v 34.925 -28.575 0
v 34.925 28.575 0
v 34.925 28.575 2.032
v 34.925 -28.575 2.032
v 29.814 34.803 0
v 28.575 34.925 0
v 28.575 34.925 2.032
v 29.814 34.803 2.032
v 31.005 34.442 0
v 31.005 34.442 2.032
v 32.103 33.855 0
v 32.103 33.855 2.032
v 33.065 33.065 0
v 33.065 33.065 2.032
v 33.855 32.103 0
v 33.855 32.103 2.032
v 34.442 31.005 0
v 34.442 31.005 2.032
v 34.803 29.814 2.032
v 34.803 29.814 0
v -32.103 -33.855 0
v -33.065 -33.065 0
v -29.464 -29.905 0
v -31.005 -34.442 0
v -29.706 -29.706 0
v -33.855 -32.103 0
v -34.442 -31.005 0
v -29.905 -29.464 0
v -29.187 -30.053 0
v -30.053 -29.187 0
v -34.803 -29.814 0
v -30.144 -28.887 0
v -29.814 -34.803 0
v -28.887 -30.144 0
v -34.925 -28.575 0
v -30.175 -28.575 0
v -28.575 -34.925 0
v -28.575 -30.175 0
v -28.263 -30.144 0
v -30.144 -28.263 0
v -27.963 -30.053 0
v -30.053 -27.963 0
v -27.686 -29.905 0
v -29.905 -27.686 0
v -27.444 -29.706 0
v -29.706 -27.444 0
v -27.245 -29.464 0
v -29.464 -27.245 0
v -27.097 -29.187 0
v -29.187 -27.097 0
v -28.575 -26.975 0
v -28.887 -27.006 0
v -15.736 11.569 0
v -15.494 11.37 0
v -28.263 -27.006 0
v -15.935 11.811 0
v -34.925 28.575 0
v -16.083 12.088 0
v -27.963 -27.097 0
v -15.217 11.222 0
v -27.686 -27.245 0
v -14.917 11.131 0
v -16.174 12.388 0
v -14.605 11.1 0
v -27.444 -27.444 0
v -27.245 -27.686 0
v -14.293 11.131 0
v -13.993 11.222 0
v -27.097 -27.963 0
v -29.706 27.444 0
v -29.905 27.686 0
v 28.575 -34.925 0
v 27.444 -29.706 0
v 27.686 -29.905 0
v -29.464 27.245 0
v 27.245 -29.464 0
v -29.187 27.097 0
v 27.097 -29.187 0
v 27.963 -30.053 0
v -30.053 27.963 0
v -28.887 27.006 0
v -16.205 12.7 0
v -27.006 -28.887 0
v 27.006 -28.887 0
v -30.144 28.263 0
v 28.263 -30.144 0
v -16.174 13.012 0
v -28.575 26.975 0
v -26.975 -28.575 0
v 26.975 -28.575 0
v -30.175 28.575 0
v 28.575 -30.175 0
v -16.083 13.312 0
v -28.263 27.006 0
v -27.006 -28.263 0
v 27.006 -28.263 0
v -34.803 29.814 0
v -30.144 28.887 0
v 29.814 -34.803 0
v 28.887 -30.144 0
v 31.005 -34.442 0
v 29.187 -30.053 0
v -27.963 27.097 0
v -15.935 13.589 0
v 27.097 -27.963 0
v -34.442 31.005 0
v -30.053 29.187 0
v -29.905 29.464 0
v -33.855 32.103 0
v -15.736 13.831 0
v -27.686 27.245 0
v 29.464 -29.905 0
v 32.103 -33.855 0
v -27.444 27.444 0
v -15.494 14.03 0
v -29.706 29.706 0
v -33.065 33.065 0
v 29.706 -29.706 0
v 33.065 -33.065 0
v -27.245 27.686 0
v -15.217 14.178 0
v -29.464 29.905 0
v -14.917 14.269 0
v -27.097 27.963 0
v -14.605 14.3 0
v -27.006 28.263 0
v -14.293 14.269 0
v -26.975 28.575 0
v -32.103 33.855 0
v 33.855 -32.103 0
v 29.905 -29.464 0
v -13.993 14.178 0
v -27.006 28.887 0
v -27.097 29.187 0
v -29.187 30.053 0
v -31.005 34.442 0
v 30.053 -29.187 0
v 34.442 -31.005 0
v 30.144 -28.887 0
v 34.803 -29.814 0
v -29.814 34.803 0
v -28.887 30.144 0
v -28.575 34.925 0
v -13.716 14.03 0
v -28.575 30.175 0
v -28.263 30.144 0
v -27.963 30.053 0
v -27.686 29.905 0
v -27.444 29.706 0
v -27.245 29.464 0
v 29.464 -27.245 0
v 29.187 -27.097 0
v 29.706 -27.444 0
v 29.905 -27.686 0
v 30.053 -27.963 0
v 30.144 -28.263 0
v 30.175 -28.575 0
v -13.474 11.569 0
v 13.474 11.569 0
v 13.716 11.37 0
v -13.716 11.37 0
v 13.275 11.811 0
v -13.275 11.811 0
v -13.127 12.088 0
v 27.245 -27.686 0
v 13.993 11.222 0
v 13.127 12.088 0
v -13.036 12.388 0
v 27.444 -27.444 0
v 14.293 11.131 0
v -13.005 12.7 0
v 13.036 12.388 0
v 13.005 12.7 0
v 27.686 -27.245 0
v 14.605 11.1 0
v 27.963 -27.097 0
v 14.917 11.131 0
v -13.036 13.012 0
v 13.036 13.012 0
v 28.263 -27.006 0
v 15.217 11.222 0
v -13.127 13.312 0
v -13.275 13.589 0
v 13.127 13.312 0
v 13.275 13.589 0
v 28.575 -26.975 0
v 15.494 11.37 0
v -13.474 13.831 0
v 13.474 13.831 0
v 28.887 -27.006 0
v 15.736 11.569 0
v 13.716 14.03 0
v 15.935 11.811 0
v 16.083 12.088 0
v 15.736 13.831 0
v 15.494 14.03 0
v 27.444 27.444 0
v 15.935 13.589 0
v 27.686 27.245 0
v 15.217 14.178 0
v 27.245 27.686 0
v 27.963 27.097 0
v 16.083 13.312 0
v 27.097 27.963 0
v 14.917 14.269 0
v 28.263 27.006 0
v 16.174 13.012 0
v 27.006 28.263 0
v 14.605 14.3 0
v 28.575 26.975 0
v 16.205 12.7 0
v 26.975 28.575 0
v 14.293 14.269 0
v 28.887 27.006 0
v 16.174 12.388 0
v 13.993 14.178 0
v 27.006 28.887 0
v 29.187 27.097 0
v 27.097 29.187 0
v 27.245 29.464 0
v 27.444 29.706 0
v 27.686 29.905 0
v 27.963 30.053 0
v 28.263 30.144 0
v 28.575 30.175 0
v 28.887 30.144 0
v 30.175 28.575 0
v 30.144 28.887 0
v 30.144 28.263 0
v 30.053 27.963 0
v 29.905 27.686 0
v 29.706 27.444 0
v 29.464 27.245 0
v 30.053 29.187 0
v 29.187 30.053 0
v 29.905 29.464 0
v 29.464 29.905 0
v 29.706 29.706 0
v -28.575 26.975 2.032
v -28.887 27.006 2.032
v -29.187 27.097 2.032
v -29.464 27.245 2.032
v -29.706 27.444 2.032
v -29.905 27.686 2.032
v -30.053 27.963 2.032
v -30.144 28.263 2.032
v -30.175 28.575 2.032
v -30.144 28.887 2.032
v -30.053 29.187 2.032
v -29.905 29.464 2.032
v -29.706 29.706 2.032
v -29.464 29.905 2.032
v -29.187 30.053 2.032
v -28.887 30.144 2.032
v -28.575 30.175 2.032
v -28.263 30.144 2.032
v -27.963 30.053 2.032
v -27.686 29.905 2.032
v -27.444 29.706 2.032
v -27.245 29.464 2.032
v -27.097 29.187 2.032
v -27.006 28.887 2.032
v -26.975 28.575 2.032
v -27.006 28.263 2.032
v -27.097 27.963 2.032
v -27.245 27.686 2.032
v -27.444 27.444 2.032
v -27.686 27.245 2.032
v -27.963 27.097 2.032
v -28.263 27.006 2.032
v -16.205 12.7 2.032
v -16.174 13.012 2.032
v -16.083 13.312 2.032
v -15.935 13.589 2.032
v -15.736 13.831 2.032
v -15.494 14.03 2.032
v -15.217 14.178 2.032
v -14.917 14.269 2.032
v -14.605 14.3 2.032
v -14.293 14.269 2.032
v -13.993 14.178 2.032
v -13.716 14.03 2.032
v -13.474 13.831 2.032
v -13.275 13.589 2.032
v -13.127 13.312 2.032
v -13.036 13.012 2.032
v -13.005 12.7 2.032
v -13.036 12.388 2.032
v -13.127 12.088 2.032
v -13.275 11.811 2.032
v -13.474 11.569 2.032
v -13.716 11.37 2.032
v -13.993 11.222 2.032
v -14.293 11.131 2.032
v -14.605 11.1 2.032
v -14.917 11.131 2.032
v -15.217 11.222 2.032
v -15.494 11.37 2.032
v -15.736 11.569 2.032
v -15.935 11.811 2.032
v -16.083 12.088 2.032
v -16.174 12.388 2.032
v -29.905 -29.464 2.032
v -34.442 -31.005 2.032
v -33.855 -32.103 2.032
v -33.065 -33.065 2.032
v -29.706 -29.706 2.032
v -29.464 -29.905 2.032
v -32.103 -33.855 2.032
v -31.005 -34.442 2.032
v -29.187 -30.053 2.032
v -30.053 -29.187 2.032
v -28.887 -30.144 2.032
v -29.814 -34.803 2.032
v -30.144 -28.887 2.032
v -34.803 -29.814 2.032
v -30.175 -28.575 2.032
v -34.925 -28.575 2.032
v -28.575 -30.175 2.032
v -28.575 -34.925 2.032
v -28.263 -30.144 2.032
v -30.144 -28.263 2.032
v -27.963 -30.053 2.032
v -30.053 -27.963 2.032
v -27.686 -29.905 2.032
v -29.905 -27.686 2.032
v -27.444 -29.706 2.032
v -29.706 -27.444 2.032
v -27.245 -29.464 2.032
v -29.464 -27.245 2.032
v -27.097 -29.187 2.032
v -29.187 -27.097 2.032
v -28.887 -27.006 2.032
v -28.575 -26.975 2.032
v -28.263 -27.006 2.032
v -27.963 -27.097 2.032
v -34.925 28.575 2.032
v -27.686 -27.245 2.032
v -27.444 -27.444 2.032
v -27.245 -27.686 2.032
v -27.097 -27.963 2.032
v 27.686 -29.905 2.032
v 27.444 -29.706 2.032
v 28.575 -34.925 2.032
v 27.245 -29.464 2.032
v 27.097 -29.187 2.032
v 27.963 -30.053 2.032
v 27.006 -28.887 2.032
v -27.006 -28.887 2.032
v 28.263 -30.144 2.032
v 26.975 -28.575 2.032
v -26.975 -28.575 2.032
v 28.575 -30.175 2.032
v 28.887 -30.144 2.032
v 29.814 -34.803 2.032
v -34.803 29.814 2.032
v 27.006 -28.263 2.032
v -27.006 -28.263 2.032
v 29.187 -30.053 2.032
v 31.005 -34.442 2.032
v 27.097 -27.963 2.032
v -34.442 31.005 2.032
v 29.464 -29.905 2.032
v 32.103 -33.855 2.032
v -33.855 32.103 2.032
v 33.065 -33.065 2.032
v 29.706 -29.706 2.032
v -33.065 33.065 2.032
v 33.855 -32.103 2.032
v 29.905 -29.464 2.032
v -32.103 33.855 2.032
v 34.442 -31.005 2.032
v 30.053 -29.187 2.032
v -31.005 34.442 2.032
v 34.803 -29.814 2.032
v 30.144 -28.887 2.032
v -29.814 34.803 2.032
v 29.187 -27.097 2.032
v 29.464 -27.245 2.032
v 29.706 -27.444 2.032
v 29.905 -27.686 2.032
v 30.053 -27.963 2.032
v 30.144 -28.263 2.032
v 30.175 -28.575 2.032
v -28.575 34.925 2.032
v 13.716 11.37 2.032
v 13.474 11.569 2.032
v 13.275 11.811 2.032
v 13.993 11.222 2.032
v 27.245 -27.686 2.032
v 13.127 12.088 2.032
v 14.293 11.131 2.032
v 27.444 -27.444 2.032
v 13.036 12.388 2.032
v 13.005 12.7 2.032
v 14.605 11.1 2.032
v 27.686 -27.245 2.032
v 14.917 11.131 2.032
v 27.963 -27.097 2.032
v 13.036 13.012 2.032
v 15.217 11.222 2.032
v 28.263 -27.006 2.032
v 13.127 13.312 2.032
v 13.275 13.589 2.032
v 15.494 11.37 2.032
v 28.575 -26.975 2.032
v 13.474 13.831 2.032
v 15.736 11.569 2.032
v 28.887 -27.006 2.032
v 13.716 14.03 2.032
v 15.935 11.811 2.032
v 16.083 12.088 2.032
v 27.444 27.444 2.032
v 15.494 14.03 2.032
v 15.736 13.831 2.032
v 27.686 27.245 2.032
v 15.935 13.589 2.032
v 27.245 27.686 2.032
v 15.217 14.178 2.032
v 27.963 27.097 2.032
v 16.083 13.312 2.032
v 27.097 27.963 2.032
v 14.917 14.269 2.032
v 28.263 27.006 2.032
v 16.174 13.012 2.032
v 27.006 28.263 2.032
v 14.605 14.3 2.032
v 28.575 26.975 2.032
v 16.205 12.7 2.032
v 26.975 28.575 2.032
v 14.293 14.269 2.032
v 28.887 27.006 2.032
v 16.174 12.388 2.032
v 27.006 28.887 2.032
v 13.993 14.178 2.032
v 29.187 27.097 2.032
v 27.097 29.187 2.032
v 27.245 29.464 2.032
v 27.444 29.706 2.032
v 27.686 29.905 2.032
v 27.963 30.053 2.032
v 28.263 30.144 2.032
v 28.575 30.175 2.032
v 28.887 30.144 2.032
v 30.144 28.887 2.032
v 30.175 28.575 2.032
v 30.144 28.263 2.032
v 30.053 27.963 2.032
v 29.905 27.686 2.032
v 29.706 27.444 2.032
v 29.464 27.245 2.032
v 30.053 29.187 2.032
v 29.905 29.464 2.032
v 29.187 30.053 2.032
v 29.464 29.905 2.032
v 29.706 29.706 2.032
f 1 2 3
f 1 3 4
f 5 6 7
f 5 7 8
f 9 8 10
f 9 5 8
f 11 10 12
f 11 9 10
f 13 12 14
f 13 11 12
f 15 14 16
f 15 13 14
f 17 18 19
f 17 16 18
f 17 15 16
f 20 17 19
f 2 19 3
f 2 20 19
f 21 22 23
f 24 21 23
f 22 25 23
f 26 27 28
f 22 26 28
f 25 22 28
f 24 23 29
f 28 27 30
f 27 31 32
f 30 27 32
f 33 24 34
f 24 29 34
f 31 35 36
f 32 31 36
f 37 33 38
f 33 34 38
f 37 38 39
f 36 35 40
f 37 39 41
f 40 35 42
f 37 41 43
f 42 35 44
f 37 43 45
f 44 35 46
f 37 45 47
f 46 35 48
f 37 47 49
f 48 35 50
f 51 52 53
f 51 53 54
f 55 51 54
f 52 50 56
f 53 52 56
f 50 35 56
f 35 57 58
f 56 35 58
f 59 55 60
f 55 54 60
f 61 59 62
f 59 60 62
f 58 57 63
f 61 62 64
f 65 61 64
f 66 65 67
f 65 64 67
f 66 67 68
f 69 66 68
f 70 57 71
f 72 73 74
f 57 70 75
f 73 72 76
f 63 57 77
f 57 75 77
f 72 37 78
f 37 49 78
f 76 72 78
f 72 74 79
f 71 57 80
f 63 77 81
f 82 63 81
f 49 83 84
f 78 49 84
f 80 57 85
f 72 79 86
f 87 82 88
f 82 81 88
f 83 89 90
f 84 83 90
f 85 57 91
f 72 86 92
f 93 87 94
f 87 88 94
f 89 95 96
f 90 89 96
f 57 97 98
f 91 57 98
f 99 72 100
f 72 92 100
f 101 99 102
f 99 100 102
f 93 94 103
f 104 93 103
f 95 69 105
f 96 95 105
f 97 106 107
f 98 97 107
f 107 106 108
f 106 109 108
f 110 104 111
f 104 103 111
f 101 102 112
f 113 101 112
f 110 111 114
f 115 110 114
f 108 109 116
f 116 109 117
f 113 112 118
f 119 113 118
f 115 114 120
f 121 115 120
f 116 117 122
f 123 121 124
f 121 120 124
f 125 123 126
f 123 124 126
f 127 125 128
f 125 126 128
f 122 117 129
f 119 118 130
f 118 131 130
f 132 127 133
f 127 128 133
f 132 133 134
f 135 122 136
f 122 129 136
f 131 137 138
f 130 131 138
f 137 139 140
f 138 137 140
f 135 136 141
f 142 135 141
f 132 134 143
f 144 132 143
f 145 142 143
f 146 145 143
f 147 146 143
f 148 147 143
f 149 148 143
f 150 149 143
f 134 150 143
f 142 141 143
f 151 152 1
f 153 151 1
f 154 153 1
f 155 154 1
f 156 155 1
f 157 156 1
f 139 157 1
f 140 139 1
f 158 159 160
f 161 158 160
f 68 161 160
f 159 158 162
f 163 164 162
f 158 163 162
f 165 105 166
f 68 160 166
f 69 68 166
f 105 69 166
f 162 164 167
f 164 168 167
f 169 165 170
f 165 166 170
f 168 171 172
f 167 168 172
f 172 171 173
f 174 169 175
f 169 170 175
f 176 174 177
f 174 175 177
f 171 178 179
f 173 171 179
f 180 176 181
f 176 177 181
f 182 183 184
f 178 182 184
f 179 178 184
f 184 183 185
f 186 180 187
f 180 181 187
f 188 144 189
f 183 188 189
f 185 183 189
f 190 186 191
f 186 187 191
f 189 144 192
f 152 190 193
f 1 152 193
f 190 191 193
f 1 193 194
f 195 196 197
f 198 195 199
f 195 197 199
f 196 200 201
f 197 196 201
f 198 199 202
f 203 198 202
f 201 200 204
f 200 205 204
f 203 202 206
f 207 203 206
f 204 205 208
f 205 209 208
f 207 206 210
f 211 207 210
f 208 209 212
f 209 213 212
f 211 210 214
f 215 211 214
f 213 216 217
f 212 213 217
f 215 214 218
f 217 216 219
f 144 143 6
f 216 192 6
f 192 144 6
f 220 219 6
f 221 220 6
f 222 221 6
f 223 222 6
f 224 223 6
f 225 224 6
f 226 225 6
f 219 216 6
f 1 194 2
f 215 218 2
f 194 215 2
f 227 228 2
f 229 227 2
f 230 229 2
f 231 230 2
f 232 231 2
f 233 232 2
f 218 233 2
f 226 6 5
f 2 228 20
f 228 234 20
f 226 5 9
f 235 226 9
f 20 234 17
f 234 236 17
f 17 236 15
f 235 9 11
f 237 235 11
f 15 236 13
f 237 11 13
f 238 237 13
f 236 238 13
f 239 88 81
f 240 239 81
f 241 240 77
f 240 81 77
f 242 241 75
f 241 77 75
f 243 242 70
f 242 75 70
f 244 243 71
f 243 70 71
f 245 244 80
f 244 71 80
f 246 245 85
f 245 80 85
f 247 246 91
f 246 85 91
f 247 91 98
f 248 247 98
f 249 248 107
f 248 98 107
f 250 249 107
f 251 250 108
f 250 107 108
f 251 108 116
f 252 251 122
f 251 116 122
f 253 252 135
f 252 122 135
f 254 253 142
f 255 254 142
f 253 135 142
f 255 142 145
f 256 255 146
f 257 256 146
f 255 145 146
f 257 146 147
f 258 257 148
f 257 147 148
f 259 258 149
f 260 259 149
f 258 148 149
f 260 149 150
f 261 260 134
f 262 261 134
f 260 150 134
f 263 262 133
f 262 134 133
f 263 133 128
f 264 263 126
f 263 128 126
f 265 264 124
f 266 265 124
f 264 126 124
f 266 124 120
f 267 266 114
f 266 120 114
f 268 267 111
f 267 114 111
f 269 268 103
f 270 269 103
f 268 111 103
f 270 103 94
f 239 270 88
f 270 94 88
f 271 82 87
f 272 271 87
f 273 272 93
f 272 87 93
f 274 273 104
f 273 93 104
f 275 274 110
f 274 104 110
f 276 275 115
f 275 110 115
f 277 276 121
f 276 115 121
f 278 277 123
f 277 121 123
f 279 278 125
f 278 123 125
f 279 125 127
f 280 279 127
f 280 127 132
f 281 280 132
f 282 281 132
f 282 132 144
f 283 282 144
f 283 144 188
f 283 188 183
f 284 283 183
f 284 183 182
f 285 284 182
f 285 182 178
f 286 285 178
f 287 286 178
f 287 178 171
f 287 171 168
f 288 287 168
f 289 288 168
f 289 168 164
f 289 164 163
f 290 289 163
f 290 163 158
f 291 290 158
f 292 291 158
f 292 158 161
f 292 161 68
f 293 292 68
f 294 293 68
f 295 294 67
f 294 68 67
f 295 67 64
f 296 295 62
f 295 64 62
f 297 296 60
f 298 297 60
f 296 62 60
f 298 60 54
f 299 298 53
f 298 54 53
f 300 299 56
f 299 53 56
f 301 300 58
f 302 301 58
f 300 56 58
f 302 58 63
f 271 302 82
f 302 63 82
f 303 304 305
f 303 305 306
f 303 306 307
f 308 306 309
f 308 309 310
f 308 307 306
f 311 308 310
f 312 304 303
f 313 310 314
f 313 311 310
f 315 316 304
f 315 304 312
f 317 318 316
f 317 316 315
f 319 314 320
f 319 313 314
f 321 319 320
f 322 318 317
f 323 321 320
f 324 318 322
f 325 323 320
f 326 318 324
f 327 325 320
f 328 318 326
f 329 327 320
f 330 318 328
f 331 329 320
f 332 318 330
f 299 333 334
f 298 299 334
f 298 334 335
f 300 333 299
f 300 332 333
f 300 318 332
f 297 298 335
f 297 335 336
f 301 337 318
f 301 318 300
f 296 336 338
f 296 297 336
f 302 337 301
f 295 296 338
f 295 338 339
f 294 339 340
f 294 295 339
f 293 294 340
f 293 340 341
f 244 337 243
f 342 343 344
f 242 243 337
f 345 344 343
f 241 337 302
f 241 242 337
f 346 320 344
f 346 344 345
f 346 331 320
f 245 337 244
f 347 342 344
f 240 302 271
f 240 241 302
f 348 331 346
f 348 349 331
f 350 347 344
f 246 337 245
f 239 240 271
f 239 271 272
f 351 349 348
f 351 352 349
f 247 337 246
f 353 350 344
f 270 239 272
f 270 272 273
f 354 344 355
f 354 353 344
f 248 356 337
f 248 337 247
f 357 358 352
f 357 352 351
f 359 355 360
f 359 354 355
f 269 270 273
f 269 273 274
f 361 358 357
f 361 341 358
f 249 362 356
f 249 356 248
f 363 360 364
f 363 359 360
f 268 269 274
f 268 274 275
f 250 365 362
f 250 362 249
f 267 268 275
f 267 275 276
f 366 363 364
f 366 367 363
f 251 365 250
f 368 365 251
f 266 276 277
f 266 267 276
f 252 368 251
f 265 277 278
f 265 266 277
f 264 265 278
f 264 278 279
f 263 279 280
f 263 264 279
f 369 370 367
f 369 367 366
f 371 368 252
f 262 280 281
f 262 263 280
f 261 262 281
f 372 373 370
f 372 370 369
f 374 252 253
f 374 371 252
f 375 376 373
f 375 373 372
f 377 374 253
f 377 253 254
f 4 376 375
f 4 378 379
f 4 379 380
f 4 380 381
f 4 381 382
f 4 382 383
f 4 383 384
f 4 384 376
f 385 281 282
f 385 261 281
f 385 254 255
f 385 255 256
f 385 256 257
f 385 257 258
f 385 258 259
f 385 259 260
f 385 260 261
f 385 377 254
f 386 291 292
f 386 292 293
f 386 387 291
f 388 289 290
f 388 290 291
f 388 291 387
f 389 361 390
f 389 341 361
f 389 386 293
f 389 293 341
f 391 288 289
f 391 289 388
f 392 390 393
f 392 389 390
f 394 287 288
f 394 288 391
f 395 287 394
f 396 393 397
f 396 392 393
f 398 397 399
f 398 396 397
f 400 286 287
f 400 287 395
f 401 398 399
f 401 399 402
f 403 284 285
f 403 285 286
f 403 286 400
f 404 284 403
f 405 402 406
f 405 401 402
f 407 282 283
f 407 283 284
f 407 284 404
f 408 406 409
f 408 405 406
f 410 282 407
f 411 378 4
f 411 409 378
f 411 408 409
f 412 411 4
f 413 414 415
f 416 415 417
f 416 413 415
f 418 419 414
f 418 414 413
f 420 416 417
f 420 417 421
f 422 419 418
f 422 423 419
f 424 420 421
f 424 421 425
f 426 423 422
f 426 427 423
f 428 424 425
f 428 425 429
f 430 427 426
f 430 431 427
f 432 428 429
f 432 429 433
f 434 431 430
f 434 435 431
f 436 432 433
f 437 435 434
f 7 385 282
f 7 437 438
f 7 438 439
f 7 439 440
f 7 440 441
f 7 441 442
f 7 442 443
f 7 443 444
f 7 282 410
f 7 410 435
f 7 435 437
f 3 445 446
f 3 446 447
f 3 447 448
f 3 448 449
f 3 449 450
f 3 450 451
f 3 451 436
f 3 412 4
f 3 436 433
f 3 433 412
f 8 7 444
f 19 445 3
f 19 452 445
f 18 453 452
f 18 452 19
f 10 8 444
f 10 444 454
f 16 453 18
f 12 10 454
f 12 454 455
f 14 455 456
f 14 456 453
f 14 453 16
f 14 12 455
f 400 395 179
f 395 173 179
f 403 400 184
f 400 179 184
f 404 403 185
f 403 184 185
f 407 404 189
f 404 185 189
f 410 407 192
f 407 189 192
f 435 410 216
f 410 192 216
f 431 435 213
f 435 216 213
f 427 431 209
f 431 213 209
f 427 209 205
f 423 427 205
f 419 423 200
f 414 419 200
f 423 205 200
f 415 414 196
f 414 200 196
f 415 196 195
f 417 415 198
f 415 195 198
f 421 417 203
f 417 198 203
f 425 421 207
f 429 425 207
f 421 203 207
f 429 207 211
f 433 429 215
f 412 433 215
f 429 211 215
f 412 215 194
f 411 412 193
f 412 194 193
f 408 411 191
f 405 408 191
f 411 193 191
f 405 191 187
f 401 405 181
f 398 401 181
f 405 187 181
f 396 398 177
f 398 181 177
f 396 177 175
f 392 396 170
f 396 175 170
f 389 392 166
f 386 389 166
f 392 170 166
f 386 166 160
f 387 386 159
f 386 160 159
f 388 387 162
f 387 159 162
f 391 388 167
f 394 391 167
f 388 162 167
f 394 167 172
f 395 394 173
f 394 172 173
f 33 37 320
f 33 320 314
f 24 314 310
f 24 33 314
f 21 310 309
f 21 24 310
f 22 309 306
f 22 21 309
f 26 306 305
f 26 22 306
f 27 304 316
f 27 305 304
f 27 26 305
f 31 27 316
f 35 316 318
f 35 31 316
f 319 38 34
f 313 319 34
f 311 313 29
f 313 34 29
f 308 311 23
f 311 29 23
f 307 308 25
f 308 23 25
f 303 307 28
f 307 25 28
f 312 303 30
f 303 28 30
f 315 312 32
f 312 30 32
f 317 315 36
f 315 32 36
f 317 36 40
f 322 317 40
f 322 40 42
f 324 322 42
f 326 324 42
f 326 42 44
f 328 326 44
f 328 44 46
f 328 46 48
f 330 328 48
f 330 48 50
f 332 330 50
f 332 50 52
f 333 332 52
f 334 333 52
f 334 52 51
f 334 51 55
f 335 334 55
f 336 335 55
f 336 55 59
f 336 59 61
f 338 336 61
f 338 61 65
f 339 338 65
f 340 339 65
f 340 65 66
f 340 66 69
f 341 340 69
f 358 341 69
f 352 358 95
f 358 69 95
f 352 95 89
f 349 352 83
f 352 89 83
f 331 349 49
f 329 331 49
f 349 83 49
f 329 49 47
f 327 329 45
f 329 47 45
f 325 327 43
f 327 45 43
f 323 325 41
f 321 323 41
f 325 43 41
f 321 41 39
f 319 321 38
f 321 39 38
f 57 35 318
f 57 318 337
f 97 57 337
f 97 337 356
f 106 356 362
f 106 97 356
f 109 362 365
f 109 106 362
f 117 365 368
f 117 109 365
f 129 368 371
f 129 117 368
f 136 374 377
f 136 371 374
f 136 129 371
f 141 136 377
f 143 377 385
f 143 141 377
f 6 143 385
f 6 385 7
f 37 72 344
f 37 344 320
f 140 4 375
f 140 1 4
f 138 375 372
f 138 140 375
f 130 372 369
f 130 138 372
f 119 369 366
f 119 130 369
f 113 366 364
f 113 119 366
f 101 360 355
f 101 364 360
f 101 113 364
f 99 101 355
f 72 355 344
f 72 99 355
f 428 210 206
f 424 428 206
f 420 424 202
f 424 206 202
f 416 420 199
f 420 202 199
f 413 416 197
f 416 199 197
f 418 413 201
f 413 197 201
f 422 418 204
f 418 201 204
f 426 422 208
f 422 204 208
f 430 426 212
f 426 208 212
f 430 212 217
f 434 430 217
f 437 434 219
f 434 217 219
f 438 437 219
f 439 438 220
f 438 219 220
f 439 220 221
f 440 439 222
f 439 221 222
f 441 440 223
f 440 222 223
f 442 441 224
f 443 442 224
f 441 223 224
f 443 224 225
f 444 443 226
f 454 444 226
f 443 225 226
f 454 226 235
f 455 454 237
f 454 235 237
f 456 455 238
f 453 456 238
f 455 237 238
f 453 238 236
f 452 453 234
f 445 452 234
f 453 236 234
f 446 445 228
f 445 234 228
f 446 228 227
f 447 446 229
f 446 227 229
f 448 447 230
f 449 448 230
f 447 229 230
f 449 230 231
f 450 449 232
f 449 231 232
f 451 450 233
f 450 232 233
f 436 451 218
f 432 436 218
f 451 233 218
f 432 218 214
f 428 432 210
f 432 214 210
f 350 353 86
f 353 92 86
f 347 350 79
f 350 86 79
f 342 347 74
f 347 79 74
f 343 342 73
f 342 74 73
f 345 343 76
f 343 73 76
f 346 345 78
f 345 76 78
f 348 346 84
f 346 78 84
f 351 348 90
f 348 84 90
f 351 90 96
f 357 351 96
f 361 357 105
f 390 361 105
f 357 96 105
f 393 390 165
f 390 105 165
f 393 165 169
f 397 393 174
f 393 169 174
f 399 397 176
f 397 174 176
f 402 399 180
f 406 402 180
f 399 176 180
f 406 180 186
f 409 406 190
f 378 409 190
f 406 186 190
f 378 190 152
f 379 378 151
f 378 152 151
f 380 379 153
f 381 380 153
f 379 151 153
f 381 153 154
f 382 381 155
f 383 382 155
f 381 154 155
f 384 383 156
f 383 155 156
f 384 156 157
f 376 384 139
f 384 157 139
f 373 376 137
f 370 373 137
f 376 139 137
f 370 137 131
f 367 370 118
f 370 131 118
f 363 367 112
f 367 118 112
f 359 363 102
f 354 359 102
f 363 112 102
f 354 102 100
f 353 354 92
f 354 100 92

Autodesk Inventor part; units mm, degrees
ref_plane "YZ Plane" through (0, 0, 0) normal (1, 0, 0) x (0, 1, 0)
ref_plane "XZ Plane" through (0, 0, 0) normal (0, 1, 0) x (-1, 0, 0)
ref_plane "XY Plane" through (0, 0, 0) normal (0, 0, 1) x (1, 0, 0)
sketch "Sketch1" plane through (0, 0, 0) normal (0, 0, 1) x (1, 0, 0)
  line L0 (28.575, -34.925) -> (-28.575, -34.925)
  line L1 (-34.925, -28.575) -> (-34.925, 28.575)
  line L2 (-28.575, 34.925) -> (28.575, 34.925)
  line L3 (34.925, 28.575) -> (34.925, -28.575)
  line L4 (34.925, -34.925) -> (-34.925, 34.925) construction
  line L5 (-34.925, -34.925) -> (34.925, 34.925) construction
  arc A0 (-28.575, 34.925) -> (-34.925, 28.575) centre (-28.575, 28.575) ccw
  arc A1 (34.925, 28.575) -> (28.575, 34.925) centre (28.575, 28.575) ccw
  arc A2 (28.575, -34.925) -> (34.925, -28.575) centre (28.575, -28.575) ccw
  arc A3 (-34.925, -28.575) -> (-28.575, -34.925) centre (-28.575, -28.575) ccw
  point P0 (0, 0)
  dimension "d0" = 69.85
  dimension "d1" = 69.85
  dimension "d2" = 6.35
extrude "Extrusion1" add sketch "Sketch1" along normal blind 2.032
sketch "Sketch2" plane through (0, 0, 2.032) normal (0, 0, 1) x (1, 0, 0)
  arc A0 (-28.575, 34.925) -> (-34.925, 28.575) centre (-28.575, 28.575) ccw projected
  arc A1 (34.925, 28.575) -> (28.575, 34.925) centre (28.575, 28.575) ccw projected
  arc A2 (28.575, -34.925) -> (34.925, -28.575) centre (28.575, -28.575) ccw projected
  arc A3 (-34.925, -28.575) -> (-28.575, -34.925) centre (-28.575, -28.575) ccw projected
  point P0 (0, 0)
hole "Hole1" at (-28.575, 28.575, 2.032) at (28.575, 28.575, 2.032) at (28.575, -28.575, 2.032) at (-28.575, -28.575, 2.032) direction (0, 0, -1) diameter 3.2 end through all
sketch "Sketch3" plane through (0, 0, 0) normal (0, 0, -1) x (-1, 0, 0)
  circle A0 centre (14.605, 12.7) radius 1.6
  circle A1 centre (-14.605, 12.7) radius 1.6
  line L0 (0, 49.4393) -> (0, -53.0853)
  point P0 (0, 0)
  dimension "d12" = 3.2
  dimension "d13" = 29.21
  dimension "d14" = 12.7
  dimension "d22" = 3.2
extrude "Extrusion2" cut sketch "Sketch3" against normal through all
equation "\"d0\" = d1"
equation "\"d22\" = d12"
properties part number "Durometer_Electronics_Enclosure-laser-cut"
